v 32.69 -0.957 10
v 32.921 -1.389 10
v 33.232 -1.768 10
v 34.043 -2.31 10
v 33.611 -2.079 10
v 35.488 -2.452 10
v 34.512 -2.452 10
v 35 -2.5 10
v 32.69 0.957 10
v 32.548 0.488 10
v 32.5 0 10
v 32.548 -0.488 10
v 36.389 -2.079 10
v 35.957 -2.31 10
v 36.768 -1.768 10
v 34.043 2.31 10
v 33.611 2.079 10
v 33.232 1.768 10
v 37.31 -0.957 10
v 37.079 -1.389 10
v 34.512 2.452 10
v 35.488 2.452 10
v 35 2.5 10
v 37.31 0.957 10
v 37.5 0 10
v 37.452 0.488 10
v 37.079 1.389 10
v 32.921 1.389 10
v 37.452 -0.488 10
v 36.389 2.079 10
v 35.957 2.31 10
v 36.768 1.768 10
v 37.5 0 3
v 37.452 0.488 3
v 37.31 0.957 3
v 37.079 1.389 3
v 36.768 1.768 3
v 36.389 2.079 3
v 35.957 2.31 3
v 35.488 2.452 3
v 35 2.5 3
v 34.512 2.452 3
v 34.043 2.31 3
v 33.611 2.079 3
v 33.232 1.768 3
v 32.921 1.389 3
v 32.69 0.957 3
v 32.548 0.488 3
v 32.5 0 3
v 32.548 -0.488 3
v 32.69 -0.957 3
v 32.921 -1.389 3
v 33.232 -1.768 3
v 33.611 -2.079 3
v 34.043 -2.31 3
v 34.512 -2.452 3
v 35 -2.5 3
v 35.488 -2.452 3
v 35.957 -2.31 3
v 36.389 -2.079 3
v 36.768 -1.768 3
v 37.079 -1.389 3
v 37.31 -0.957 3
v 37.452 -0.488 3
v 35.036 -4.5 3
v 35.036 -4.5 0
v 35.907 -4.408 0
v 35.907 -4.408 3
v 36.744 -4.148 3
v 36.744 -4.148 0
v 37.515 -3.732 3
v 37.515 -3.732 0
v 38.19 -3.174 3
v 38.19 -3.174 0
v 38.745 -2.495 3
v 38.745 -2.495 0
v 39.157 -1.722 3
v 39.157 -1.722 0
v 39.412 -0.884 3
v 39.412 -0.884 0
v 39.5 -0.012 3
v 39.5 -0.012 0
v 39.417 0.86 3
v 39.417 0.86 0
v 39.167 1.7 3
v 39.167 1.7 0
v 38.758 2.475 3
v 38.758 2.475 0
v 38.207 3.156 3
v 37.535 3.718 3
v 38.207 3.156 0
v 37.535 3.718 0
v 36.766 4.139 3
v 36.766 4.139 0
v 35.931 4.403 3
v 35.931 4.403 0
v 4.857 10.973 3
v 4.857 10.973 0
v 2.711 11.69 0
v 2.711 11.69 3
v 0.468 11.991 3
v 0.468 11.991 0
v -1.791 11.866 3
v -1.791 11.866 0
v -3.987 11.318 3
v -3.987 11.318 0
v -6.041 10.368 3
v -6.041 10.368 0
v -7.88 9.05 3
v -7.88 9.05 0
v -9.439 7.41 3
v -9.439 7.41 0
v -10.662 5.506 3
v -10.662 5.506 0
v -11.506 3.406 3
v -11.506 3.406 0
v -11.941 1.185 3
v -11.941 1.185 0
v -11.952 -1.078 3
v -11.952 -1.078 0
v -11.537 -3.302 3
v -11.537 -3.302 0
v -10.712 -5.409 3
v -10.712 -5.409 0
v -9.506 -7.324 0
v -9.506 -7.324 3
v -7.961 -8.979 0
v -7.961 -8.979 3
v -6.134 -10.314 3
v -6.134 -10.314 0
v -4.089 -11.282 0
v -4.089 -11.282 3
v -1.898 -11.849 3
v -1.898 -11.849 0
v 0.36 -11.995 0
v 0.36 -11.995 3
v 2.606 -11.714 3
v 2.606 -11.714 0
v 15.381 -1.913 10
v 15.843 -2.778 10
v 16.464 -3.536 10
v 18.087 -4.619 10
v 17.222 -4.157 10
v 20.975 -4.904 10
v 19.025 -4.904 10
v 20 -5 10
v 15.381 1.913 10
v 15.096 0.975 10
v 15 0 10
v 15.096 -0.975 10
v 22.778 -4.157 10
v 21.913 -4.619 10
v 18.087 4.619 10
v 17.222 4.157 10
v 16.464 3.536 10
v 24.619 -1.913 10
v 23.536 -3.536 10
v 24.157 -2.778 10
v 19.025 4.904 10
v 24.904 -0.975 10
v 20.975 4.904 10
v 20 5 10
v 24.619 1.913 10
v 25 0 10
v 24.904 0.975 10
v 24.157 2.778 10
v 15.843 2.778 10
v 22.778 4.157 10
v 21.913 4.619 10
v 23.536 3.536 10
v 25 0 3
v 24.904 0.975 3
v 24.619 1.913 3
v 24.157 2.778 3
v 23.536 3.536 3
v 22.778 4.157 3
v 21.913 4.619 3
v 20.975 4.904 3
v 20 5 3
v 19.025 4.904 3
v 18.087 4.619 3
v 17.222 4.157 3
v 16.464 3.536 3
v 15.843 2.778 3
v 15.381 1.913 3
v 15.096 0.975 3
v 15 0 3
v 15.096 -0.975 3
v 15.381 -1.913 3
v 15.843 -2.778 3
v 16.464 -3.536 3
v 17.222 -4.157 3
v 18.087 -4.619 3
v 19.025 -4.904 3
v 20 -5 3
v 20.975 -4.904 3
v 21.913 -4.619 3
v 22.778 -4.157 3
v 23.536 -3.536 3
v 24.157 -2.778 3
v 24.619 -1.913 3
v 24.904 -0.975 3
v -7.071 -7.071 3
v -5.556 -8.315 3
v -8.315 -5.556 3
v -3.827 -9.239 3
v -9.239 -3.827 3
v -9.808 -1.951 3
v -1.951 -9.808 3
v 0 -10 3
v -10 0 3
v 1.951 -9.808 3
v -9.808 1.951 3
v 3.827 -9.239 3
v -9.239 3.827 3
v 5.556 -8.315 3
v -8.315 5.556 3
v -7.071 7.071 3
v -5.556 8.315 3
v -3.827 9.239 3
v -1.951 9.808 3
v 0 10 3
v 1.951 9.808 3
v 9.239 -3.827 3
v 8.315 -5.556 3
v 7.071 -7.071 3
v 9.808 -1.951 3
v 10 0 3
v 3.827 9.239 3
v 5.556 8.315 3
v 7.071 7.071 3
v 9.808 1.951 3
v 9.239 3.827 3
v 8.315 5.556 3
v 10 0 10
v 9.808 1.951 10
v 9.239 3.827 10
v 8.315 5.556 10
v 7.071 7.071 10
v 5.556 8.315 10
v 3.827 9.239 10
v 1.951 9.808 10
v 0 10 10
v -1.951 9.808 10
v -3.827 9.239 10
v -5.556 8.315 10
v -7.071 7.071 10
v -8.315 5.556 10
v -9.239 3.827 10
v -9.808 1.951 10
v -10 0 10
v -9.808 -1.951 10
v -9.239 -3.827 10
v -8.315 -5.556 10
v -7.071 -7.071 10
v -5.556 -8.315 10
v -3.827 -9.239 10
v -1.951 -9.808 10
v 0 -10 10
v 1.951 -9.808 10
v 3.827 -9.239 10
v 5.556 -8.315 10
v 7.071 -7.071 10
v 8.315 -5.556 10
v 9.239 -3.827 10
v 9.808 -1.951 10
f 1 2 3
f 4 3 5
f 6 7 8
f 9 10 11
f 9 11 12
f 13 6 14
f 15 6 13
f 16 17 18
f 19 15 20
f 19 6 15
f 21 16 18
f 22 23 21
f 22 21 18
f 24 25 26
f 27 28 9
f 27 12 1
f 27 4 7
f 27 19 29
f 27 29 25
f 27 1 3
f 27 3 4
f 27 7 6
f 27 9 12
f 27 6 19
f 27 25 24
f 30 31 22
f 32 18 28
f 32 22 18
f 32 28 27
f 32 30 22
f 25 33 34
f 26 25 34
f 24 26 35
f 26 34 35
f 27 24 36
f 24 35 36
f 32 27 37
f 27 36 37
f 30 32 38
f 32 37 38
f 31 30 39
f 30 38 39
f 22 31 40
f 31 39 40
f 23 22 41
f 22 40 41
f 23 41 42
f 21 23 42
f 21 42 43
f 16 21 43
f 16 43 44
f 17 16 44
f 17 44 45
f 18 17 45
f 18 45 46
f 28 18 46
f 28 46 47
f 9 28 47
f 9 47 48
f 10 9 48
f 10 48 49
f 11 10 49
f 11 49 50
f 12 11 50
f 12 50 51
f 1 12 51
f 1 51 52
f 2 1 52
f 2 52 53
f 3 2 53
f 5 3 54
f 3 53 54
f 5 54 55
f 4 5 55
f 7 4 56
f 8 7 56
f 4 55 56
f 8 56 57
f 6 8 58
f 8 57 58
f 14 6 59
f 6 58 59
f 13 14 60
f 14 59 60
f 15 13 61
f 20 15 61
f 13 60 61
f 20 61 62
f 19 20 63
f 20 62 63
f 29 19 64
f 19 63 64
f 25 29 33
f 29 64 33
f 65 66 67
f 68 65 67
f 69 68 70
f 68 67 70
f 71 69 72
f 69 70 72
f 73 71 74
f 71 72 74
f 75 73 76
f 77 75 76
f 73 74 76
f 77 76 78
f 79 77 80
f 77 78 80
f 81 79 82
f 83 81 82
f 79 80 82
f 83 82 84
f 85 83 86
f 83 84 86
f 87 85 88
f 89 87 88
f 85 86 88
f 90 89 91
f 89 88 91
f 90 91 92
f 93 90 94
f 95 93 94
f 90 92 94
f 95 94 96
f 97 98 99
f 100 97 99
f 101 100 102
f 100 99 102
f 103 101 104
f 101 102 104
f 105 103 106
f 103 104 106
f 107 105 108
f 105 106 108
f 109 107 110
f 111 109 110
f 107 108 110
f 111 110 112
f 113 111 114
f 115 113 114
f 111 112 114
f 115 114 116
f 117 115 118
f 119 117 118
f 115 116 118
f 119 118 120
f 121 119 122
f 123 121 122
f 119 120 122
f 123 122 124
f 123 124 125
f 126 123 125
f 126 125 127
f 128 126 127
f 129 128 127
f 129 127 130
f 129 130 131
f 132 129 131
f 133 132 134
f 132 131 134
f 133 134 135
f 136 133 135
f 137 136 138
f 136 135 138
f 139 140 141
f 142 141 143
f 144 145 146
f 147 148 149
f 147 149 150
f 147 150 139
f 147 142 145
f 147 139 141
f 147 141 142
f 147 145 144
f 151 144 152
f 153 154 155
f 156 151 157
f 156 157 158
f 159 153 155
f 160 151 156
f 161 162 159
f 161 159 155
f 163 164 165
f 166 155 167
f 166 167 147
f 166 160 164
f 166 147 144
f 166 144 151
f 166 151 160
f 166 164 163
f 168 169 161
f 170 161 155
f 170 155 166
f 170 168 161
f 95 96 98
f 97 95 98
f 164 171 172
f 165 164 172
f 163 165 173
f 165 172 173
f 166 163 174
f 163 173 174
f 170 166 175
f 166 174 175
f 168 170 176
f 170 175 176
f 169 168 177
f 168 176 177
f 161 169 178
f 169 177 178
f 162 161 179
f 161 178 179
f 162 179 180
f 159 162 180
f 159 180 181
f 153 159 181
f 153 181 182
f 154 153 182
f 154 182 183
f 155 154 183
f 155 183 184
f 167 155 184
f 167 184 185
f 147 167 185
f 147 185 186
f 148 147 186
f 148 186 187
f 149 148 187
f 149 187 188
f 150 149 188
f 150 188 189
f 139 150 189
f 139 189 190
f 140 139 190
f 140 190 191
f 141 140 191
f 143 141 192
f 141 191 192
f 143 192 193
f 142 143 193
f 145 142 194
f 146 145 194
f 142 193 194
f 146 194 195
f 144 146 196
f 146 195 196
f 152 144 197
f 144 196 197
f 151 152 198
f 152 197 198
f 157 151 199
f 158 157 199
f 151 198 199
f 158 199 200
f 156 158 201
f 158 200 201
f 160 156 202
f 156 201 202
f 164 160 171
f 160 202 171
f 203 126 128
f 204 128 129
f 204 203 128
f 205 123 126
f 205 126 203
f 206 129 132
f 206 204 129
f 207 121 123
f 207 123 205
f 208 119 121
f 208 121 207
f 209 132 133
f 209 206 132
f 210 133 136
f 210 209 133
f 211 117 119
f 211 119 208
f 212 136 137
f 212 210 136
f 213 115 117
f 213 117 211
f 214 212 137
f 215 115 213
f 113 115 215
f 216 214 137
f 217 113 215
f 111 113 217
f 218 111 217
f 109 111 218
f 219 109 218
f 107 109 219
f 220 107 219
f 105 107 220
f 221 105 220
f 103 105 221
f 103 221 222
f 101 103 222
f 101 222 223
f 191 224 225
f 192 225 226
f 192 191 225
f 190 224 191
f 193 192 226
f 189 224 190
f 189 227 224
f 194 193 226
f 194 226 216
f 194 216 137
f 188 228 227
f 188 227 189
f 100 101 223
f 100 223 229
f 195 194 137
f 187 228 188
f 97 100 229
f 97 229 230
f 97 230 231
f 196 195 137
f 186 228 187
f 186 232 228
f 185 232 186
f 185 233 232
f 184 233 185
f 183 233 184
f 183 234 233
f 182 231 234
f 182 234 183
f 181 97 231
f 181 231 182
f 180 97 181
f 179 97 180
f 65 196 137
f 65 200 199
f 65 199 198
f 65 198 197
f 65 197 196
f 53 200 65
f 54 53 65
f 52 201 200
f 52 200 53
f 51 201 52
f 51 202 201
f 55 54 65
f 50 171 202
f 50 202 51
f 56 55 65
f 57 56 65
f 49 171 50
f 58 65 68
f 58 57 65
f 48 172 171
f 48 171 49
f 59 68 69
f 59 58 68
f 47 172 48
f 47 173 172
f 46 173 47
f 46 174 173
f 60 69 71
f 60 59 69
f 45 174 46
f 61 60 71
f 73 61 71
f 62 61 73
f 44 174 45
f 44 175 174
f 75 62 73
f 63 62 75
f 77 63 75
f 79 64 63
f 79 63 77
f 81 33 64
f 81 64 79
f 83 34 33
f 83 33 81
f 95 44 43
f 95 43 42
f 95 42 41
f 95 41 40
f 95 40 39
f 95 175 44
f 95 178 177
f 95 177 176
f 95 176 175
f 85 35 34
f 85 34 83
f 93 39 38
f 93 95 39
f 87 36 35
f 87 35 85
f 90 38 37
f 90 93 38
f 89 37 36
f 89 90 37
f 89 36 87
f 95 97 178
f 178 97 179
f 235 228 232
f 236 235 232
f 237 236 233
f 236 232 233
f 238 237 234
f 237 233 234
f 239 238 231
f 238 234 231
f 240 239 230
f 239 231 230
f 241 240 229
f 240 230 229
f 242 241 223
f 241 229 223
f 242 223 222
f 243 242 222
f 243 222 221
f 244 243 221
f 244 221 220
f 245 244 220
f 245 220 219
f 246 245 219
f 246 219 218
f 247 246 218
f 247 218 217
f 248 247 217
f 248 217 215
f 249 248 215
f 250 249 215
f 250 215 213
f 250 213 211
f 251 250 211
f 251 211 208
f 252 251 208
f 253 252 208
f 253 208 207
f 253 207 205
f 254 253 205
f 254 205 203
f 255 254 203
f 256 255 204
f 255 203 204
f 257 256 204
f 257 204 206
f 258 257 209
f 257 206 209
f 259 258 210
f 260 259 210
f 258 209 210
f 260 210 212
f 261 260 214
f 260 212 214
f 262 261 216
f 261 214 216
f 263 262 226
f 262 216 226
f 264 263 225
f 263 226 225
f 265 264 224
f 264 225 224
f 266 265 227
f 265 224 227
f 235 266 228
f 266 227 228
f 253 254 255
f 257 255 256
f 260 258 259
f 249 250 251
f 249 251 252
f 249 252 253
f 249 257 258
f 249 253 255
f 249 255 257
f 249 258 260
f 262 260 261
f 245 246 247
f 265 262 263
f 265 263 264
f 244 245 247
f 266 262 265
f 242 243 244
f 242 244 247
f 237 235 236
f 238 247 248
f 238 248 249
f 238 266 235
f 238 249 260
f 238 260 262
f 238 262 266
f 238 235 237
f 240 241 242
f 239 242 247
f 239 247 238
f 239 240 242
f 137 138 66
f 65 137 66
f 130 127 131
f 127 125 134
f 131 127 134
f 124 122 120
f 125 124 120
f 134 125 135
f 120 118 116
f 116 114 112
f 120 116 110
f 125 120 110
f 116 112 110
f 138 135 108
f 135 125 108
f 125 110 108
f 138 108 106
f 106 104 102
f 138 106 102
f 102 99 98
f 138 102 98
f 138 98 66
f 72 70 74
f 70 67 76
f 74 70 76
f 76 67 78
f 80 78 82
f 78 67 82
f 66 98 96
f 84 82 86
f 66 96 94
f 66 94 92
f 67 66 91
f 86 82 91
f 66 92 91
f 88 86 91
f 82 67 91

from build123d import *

# Parameters (mm, degrees)
F0_R     = 10
F0_R_2   = 5
F0_R_3   = 2.5
F1_DEPTH = 3
F2_DEPTH = 10


with BuildPart() as f1:
    # F0 (on Top) → F1 (new body)
    with BuildSketch(Plane.XY):
        with BuildLine():
            Line((2.605609, -11.713701), (35.035962, -4.499856))
            ThreePointArc((35.035962, -4.499856), (39.477433, -0.450106), (35.930912, 4.402659))
            Line((35.930912, 4.402659), (4.857465, 10.972923))
            ThreePointArc((4.857465, 10.972923), (-11.941319, 1.185285), (2.605609, -11.713701))
        make_face()
        Circle(F0_R, mode=Mode.SUBTRACT)
        with Locations((20, 0)):
            Circle(F0_R_2, mode=Mode.SUBTRACT)
        with Locations((35, 0)):
            Circle(F0_R_3, mode=Mode.SUBTRACT)
        Circle(F0_R)
        with Locations((20, 0)):
            Circle(F0_R_2)
        with Locations((35, 0)):
            Circle(F0_R_3)
    extrude(amount=F1_DEPTH)

    # F0 (on Top) → F2 (join)
    with BuildSketch(Plane.XY):
        Circle(F0_R)
        with Locations((20, 0)):
            Circle(F0_R_2)
        with Locations((35, 0)):
            Circle(F0_R_3)
    extrude(amount=F2_DEPTH)


solid = f1.part
